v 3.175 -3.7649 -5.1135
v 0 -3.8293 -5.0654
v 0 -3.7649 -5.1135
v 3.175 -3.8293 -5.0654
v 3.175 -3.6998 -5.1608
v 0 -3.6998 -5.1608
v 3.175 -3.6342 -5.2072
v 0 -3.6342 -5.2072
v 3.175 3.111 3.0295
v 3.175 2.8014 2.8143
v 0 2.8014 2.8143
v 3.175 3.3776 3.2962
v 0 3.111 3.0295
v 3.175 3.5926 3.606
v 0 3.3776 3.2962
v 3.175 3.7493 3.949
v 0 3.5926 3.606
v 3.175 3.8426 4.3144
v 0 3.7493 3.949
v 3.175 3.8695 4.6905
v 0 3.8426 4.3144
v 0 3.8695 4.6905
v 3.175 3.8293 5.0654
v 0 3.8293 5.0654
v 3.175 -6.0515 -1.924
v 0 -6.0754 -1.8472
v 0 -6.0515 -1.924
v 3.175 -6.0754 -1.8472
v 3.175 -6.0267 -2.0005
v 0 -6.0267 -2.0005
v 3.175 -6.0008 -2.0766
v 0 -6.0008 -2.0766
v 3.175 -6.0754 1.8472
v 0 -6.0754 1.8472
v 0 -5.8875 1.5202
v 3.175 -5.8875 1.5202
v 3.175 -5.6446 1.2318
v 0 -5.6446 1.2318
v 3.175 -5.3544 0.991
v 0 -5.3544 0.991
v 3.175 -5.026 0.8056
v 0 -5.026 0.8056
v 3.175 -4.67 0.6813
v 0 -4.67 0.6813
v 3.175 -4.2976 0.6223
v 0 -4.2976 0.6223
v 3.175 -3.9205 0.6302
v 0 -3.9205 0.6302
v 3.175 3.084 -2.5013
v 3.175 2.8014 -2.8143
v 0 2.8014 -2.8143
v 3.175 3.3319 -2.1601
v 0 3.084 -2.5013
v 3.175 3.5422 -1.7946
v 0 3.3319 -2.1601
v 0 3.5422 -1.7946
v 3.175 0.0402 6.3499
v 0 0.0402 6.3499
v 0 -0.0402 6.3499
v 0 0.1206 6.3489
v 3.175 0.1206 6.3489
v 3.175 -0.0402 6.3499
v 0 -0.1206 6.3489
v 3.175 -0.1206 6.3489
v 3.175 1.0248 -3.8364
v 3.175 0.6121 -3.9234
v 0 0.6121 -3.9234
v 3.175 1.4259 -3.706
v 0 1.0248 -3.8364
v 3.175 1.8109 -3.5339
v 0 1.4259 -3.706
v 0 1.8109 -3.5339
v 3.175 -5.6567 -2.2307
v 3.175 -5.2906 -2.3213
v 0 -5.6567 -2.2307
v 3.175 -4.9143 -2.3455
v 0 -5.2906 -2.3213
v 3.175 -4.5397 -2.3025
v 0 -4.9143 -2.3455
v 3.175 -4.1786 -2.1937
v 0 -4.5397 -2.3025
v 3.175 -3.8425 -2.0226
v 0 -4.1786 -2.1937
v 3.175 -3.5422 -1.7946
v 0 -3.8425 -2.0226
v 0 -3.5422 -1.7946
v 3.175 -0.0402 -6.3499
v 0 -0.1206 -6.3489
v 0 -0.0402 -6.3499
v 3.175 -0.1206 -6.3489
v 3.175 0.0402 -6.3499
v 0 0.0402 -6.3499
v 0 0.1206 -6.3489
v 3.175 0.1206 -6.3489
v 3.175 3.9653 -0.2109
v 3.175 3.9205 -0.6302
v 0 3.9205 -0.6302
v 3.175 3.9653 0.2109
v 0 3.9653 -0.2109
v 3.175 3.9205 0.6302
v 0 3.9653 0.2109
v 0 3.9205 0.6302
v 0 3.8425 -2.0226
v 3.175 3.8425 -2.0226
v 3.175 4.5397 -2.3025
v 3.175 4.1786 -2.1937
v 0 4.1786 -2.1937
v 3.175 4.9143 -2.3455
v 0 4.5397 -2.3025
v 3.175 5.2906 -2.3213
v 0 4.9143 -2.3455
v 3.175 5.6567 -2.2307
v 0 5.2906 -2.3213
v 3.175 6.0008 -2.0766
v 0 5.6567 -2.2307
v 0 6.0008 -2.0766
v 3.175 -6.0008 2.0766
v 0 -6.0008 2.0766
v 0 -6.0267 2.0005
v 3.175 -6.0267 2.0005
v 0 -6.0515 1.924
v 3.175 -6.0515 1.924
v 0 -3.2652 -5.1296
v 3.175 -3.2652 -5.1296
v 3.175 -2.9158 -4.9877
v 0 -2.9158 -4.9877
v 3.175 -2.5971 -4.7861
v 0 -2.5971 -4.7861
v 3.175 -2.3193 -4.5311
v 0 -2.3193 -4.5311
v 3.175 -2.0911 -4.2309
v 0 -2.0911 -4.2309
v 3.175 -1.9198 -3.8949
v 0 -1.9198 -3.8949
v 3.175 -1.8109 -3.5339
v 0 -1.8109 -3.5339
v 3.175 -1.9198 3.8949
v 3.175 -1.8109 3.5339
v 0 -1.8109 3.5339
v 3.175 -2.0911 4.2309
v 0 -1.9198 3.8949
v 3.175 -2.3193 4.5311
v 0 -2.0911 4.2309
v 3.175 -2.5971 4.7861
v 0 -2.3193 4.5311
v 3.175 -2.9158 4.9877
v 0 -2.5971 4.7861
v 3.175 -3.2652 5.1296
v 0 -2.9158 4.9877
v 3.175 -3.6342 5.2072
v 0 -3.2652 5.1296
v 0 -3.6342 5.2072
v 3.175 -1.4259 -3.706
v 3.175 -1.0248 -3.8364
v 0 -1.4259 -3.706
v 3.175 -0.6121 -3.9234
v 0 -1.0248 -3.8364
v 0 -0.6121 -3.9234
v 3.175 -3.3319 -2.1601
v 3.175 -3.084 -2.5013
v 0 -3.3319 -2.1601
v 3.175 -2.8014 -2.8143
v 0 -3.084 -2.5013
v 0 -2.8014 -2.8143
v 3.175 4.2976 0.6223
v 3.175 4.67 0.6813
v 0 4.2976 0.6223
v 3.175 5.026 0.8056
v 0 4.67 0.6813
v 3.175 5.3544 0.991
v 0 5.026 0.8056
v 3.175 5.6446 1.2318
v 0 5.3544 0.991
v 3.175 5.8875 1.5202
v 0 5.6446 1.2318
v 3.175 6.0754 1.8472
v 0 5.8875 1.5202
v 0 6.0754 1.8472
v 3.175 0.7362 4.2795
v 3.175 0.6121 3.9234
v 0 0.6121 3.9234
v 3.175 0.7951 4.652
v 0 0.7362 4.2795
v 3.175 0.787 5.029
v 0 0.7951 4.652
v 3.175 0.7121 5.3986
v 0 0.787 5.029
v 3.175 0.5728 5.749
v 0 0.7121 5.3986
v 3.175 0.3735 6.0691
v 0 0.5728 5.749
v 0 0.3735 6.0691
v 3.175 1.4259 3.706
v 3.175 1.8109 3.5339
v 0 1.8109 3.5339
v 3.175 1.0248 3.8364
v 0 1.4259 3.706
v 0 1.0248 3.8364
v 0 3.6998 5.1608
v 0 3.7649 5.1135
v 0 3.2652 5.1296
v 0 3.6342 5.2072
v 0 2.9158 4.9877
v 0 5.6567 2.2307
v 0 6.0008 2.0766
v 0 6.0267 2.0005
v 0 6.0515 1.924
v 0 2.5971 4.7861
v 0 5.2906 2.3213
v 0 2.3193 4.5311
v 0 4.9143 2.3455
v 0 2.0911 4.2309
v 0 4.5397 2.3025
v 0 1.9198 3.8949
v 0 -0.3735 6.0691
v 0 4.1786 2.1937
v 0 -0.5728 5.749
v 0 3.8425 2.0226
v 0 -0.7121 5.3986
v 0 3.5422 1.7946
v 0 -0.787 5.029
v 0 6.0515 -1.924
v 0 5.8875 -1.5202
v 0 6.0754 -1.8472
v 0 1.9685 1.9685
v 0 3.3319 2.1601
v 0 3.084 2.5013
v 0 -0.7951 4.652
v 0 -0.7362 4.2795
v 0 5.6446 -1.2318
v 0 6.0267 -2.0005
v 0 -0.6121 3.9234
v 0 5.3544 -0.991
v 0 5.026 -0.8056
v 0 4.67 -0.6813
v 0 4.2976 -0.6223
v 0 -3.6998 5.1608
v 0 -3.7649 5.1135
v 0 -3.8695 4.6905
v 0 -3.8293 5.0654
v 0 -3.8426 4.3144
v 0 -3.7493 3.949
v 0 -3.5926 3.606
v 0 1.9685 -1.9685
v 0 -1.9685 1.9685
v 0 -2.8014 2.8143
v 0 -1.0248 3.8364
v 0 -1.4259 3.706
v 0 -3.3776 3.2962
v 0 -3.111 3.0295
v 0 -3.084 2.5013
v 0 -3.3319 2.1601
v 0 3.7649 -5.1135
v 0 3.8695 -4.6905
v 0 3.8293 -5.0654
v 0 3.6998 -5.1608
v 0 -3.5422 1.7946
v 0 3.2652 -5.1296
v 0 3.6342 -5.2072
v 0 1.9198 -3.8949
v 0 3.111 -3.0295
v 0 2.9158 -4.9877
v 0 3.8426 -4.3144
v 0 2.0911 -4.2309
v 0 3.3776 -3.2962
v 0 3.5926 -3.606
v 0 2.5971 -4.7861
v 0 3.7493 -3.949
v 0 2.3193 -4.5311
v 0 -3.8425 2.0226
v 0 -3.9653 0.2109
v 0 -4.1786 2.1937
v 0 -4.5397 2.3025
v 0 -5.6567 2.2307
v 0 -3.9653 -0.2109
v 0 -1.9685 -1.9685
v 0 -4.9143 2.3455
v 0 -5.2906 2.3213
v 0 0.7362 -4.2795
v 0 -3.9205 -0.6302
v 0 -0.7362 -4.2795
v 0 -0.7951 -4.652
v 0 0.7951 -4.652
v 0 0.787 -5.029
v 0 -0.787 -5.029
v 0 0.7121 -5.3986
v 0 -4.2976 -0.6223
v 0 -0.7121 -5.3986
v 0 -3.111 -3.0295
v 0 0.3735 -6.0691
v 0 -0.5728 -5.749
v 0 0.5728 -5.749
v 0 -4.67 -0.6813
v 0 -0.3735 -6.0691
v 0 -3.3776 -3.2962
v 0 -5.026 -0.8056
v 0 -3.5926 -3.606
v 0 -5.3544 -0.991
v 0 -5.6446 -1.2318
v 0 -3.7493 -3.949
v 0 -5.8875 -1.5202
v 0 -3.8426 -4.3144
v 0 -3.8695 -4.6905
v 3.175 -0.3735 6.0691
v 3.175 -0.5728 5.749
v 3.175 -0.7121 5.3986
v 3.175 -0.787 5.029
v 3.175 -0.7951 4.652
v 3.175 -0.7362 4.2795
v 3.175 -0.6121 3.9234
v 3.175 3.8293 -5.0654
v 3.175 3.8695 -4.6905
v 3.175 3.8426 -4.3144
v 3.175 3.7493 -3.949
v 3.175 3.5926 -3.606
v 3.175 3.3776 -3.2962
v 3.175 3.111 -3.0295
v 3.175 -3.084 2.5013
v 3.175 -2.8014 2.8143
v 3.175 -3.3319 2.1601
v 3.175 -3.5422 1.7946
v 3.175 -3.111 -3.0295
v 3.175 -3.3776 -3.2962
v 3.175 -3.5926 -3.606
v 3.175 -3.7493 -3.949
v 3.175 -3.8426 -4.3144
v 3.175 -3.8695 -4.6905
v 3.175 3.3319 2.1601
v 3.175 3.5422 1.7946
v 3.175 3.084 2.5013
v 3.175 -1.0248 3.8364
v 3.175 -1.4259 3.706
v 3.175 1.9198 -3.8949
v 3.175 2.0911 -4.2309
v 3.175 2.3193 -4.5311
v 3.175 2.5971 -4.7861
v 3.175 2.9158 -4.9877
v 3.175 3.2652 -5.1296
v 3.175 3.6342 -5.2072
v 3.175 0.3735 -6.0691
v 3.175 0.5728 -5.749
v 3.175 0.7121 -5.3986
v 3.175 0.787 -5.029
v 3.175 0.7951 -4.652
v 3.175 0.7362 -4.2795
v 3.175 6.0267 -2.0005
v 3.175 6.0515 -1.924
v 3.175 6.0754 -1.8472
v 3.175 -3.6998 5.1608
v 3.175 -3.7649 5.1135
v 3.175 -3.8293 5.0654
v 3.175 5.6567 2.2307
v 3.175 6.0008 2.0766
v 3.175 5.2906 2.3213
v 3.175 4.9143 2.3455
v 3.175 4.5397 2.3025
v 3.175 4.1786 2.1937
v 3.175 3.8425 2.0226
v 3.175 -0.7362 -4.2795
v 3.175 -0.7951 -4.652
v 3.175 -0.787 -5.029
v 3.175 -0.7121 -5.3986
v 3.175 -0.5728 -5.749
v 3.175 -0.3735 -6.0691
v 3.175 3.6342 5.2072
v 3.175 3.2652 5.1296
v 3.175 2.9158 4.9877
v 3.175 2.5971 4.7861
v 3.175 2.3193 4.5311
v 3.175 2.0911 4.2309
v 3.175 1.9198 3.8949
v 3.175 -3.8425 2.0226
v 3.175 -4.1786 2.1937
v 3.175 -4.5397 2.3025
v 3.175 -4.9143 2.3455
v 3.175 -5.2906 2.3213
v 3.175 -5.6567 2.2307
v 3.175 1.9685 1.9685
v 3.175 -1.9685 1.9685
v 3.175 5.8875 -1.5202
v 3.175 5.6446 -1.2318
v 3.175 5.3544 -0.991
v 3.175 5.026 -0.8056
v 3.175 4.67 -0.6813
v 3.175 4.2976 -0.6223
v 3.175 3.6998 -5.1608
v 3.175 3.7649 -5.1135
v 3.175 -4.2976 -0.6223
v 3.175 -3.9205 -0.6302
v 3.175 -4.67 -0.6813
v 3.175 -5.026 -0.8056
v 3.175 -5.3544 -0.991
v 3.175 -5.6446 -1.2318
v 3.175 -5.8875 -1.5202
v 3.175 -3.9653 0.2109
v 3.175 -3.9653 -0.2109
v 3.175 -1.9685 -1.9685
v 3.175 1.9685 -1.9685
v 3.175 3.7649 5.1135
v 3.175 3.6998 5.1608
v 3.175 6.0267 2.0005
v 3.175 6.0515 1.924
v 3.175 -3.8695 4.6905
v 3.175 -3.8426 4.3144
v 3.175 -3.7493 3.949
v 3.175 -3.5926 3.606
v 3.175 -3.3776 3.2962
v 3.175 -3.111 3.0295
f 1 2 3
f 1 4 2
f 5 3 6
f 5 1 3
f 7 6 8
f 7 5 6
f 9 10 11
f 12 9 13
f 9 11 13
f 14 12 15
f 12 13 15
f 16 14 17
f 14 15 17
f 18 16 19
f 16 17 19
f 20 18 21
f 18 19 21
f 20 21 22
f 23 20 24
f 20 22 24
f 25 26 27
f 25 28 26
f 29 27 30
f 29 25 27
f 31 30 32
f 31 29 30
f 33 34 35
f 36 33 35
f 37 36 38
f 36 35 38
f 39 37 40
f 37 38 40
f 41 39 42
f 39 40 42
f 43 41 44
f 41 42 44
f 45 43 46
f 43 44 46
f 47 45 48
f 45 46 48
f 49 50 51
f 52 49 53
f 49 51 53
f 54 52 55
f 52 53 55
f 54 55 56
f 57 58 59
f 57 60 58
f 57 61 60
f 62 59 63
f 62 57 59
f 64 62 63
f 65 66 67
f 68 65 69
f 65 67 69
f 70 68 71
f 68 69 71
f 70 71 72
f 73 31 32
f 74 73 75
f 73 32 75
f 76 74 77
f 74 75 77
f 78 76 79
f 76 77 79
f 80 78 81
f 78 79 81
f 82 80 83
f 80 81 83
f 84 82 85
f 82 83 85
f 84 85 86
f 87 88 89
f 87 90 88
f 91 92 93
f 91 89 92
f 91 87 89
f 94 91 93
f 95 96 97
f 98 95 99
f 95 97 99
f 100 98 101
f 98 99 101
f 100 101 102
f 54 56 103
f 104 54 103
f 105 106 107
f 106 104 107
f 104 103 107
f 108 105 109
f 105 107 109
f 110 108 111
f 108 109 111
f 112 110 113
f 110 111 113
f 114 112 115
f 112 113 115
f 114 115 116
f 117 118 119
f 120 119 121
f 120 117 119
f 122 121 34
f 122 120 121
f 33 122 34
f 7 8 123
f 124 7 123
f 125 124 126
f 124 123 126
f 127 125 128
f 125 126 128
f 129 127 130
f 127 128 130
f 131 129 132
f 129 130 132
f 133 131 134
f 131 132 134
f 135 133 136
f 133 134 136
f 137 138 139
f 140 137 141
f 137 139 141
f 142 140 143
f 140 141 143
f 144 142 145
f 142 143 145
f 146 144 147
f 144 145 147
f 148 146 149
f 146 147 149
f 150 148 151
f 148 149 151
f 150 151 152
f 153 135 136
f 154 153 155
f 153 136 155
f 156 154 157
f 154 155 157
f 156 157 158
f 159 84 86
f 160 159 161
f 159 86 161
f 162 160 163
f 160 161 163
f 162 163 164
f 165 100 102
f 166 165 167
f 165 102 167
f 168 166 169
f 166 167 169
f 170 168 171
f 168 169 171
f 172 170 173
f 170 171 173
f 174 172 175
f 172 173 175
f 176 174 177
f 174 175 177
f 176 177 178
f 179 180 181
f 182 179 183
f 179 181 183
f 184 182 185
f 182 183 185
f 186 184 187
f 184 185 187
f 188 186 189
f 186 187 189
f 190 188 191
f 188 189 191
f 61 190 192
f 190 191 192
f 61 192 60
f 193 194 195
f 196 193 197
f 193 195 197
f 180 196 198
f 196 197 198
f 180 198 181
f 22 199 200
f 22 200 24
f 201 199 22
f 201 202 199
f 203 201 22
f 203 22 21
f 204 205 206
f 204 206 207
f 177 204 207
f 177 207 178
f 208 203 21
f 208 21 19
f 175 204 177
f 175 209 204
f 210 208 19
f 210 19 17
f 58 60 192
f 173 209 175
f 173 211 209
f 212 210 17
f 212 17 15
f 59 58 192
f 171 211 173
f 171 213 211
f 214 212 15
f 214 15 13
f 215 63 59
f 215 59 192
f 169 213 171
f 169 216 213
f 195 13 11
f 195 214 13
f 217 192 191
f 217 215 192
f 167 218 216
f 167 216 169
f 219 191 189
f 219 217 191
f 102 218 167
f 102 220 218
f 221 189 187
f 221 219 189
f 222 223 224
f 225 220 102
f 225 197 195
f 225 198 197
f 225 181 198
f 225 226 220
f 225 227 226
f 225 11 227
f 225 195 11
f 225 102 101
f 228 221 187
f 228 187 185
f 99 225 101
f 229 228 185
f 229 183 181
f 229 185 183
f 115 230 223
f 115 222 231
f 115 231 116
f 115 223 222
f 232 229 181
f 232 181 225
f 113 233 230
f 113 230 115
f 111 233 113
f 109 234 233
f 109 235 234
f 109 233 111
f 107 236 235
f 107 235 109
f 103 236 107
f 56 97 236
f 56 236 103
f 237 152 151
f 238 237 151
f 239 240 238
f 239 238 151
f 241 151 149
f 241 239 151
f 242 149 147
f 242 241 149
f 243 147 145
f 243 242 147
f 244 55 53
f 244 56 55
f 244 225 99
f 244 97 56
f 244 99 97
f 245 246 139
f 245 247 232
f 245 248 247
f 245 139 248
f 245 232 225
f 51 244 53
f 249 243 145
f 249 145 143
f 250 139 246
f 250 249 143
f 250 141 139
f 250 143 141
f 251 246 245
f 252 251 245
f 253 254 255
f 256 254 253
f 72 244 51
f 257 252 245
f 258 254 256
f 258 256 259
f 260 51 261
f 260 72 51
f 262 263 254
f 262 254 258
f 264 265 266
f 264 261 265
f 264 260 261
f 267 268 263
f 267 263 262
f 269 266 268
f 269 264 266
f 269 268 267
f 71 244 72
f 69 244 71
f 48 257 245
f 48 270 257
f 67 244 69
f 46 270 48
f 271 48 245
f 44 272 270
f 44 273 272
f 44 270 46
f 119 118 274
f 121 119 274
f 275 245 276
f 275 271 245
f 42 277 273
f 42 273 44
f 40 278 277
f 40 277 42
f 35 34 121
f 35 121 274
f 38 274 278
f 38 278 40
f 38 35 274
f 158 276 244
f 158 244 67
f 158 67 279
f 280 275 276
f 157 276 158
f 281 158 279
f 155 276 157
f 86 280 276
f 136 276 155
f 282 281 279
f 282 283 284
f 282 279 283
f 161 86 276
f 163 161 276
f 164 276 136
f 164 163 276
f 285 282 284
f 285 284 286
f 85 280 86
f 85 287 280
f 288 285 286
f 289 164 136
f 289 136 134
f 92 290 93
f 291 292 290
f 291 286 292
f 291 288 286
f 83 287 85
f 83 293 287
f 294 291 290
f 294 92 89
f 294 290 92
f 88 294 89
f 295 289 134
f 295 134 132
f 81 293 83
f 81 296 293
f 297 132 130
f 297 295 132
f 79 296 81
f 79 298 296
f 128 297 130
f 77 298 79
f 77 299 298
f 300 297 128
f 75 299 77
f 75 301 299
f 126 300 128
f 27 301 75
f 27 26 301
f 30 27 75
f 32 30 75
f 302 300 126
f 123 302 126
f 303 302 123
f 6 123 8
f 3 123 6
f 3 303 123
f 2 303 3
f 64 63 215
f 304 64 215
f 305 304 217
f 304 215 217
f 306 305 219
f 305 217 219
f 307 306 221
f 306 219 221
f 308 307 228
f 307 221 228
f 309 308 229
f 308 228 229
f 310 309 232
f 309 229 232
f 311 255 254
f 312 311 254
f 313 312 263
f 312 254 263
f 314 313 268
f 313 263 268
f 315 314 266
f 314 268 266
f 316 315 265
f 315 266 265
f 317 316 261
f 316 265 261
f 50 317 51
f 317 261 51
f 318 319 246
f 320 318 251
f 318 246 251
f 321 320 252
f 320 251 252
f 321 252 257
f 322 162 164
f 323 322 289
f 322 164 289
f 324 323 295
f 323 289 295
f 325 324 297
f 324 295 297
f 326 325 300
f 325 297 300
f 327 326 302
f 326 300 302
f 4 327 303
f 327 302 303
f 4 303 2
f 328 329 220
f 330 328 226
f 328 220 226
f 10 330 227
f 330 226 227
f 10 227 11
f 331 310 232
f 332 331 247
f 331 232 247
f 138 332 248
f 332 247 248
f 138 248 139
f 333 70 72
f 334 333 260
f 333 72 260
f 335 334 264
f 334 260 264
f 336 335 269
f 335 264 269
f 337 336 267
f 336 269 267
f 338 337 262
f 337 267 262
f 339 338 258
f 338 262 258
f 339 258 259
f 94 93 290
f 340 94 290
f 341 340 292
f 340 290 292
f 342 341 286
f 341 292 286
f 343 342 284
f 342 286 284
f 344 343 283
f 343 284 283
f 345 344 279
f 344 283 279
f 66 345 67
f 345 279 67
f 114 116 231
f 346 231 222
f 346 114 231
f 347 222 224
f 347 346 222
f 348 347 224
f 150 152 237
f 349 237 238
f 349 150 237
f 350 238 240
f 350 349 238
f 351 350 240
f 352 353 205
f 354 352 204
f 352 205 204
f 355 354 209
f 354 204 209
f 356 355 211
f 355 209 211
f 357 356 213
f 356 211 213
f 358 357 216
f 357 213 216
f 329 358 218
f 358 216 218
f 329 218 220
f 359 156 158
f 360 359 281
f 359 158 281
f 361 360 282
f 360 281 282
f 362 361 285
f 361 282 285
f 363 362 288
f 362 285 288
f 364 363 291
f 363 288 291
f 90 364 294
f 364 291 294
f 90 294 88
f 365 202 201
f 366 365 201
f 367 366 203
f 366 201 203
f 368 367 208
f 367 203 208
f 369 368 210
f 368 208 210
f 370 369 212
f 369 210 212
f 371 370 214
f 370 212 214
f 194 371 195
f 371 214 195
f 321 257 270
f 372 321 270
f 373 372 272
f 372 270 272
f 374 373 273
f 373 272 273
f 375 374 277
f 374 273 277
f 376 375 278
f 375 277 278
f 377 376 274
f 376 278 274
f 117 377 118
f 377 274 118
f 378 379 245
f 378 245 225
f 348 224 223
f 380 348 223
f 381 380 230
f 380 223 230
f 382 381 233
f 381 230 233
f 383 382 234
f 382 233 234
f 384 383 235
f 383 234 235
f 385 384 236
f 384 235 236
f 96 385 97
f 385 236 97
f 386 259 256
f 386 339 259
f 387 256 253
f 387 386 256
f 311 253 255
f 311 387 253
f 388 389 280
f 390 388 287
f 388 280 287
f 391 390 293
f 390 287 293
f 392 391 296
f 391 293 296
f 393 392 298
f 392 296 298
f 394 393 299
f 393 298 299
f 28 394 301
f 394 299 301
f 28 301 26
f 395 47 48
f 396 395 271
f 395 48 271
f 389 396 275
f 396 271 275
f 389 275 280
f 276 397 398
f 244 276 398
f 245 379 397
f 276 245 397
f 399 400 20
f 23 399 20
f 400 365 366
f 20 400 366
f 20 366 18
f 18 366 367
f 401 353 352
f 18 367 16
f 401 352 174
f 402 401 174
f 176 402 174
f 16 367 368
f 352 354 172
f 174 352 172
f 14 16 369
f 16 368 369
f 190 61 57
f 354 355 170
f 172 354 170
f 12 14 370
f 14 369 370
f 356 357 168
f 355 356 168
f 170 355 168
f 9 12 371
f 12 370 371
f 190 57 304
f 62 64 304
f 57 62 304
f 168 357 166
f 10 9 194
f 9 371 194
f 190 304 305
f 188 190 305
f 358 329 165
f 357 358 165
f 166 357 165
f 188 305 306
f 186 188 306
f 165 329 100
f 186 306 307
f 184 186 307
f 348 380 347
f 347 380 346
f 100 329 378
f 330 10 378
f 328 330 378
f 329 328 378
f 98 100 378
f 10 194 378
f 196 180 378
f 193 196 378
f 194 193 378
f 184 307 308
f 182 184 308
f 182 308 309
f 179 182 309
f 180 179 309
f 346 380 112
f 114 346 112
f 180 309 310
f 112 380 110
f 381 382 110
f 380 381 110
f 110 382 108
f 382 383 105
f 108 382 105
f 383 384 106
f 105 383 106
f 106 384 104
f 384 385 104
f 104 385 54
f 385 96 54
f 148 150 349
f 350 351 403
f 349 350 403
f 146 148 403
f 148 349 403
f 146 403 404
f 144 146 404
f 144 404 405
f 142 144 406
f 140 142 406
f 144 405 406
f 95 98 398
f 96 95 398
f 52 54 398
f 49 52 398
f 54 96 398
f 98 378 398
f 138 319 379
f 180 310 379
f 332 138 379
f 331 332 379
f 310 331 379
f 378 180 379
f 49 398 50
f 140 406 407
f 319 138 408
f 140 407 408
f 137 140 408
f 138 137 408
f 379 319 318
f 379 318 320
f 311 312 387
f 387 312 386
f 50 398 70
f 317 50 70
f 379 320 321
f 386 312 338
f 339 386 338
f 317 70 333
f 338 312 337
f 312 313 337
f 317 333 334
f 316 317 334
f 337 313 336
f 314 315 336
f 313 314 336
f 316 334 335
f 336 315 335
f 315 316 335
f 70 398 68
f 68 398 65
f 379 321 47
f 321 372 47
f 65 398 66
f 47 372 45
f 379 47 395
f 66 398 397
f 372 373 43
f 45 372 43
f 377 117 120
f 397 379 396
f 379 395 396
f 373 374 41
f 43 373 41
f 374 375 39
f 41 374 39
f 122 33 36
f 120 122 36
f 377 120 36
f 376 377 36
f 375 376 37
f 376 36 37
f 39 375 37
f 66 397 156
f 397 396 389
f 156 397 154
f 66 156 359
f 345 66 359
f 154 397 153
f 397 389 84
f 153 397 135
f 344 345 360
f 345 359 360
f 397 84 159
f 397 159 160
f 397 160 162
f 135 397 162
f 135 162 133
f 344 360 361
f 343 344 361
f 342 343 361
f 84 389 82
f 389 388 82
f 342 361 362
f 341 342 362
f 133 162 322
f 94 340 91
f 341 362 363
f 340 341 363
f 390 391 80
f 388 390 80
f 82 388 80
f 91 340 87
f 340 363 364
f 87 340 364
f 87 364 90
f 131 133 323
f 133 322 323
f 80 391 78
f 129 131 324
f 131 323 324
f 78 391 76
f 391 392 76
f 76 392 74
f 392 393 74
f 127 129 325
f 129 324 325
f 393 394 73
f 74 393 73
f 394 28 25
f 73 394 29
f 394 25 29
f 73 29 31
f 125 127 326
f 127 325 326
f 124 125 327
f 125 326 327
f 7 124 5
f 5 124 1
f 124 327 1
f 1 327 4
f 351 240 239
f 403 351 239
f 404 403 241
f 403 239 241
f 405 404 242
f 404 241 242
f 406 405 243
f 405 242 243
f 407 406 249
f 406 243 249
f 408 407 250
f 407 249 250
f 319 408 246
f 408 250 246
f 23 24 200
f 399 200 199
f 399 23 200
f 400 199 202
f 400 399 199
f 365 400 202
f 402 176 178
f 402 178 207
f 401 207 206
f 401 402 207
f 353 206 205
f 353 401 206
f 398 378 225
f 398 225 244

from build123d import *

# Parameters (mm, degrees)
BASPROSKE_W             = 3.175
BASPROSKE_H             = 6.35
TOOTHCUT_DEPTH          = 10.525
TEETHCUTS_COUNT         = 10
TEETHCUTS_ANGLE         = 324
BORSKE_R                = 0.99949
BORE_DEPTH              = 50.8000508
SKETCH1_W               = 3.937
SKETCH1_H               = 3.937
CUT_EXTRUDE1_DEPTH      = 10.344170464
CUT_EXTRUDE1_DEPTH_BACK = 10.344170464


with BuildPart() as part:
    # BasProSke → Base-Revolve (revolve)
    with BuildSketch(Plane(origin=(0, 0, 0), x_dir=(1, 0, 0), z_dir=(0, 1, 0)), mode=Mode.PRIVATE) as base_revolve_sk:
        with Locations((1.5875, 3.175)):
            Rectangle(BASPROSKE_W, BASPROSKE_H)
    revolve(base_revolve_sk.sketch.rotate(Axis((-10, 0, 0), (1, 0, 0)), 180), axis=Axis((-10, 0, 0), (1, 0, 0)))

    # TooCutSke → ToothCut (cut, through all)
    with BuildSketch(Plane(origin=(0, 0, 0), x_dir=(0, 0, -1), z_dir=(1, 0, 0))):
        with BuildLine():
            ThreePointArc((0.630210727, 3.920537785), (0, 3.970866667), (-0.630210727, 3.920537785))
            ThreePointArc((-0.630210727, 3.920537785), (-0.900510691, 5.2110639), (-1.88228345, 6.091201374))
            ThreePointArc((-1.88228345, 6.091201374), (0, 6.3754), (1.88228345, 6.091201374))
            ThreePointArc((1.88228345, 6.091201374), (0.900510691, 5.2110639), (0.630210727, 3.920537785))
        make_face()
    toothcut = extrude(amount=TOOTHCUT_DEPTH, mode=Mode.SUBTRACT)

    # TeethCuts: ToothCut ×10 about axis
    teethcuts_axis = Axis((-10, 0, 0), (1, 0, 0))
    for i in range(1, TEETHCUTS_COUNT):
        add(toothcut.rotate(teethcuts_axis, i * TEETHCUTS_ANGLE / (TEETHCUTS_COUNT - 1)), mode=Mode.SUBTRACT)

    # BorSke → Bore (cut, symmetric)
    with BuildSketch(Plane(origin=(0, 0, 0), x_dir=(0, 0, -1), z_dir=(1, 0, 0))):
        with Locations(Location((0, 0, 0), (0, 0, 180))):
            Circle(BORSKE_R)
    extrude(amount=BORE_DEPTH, both=True, mode=Mode.SUBTRACT)

    # Sketch1 → Cut-Extrude1 (cut, two sides)
    with BuildSketch(Plane(origin=(3.175, 0, 0), x_dir=(0, 0, -1), z_dir=(1, 0, 0))) as cut_extrude1_sk:
        Rectangle(SKETCH1_W, SKETCH1_H)
    extrude(amount=CUT_EXTRUDE1_DEPTH, mode=Mode.SUBTRACT)
    extrude(cut_extrude1_sk.sketch, amount=-CUT_EXTRUDE1_DEPTH_BACK, mode=Mode.SUBTRACT)


solid = part.part
